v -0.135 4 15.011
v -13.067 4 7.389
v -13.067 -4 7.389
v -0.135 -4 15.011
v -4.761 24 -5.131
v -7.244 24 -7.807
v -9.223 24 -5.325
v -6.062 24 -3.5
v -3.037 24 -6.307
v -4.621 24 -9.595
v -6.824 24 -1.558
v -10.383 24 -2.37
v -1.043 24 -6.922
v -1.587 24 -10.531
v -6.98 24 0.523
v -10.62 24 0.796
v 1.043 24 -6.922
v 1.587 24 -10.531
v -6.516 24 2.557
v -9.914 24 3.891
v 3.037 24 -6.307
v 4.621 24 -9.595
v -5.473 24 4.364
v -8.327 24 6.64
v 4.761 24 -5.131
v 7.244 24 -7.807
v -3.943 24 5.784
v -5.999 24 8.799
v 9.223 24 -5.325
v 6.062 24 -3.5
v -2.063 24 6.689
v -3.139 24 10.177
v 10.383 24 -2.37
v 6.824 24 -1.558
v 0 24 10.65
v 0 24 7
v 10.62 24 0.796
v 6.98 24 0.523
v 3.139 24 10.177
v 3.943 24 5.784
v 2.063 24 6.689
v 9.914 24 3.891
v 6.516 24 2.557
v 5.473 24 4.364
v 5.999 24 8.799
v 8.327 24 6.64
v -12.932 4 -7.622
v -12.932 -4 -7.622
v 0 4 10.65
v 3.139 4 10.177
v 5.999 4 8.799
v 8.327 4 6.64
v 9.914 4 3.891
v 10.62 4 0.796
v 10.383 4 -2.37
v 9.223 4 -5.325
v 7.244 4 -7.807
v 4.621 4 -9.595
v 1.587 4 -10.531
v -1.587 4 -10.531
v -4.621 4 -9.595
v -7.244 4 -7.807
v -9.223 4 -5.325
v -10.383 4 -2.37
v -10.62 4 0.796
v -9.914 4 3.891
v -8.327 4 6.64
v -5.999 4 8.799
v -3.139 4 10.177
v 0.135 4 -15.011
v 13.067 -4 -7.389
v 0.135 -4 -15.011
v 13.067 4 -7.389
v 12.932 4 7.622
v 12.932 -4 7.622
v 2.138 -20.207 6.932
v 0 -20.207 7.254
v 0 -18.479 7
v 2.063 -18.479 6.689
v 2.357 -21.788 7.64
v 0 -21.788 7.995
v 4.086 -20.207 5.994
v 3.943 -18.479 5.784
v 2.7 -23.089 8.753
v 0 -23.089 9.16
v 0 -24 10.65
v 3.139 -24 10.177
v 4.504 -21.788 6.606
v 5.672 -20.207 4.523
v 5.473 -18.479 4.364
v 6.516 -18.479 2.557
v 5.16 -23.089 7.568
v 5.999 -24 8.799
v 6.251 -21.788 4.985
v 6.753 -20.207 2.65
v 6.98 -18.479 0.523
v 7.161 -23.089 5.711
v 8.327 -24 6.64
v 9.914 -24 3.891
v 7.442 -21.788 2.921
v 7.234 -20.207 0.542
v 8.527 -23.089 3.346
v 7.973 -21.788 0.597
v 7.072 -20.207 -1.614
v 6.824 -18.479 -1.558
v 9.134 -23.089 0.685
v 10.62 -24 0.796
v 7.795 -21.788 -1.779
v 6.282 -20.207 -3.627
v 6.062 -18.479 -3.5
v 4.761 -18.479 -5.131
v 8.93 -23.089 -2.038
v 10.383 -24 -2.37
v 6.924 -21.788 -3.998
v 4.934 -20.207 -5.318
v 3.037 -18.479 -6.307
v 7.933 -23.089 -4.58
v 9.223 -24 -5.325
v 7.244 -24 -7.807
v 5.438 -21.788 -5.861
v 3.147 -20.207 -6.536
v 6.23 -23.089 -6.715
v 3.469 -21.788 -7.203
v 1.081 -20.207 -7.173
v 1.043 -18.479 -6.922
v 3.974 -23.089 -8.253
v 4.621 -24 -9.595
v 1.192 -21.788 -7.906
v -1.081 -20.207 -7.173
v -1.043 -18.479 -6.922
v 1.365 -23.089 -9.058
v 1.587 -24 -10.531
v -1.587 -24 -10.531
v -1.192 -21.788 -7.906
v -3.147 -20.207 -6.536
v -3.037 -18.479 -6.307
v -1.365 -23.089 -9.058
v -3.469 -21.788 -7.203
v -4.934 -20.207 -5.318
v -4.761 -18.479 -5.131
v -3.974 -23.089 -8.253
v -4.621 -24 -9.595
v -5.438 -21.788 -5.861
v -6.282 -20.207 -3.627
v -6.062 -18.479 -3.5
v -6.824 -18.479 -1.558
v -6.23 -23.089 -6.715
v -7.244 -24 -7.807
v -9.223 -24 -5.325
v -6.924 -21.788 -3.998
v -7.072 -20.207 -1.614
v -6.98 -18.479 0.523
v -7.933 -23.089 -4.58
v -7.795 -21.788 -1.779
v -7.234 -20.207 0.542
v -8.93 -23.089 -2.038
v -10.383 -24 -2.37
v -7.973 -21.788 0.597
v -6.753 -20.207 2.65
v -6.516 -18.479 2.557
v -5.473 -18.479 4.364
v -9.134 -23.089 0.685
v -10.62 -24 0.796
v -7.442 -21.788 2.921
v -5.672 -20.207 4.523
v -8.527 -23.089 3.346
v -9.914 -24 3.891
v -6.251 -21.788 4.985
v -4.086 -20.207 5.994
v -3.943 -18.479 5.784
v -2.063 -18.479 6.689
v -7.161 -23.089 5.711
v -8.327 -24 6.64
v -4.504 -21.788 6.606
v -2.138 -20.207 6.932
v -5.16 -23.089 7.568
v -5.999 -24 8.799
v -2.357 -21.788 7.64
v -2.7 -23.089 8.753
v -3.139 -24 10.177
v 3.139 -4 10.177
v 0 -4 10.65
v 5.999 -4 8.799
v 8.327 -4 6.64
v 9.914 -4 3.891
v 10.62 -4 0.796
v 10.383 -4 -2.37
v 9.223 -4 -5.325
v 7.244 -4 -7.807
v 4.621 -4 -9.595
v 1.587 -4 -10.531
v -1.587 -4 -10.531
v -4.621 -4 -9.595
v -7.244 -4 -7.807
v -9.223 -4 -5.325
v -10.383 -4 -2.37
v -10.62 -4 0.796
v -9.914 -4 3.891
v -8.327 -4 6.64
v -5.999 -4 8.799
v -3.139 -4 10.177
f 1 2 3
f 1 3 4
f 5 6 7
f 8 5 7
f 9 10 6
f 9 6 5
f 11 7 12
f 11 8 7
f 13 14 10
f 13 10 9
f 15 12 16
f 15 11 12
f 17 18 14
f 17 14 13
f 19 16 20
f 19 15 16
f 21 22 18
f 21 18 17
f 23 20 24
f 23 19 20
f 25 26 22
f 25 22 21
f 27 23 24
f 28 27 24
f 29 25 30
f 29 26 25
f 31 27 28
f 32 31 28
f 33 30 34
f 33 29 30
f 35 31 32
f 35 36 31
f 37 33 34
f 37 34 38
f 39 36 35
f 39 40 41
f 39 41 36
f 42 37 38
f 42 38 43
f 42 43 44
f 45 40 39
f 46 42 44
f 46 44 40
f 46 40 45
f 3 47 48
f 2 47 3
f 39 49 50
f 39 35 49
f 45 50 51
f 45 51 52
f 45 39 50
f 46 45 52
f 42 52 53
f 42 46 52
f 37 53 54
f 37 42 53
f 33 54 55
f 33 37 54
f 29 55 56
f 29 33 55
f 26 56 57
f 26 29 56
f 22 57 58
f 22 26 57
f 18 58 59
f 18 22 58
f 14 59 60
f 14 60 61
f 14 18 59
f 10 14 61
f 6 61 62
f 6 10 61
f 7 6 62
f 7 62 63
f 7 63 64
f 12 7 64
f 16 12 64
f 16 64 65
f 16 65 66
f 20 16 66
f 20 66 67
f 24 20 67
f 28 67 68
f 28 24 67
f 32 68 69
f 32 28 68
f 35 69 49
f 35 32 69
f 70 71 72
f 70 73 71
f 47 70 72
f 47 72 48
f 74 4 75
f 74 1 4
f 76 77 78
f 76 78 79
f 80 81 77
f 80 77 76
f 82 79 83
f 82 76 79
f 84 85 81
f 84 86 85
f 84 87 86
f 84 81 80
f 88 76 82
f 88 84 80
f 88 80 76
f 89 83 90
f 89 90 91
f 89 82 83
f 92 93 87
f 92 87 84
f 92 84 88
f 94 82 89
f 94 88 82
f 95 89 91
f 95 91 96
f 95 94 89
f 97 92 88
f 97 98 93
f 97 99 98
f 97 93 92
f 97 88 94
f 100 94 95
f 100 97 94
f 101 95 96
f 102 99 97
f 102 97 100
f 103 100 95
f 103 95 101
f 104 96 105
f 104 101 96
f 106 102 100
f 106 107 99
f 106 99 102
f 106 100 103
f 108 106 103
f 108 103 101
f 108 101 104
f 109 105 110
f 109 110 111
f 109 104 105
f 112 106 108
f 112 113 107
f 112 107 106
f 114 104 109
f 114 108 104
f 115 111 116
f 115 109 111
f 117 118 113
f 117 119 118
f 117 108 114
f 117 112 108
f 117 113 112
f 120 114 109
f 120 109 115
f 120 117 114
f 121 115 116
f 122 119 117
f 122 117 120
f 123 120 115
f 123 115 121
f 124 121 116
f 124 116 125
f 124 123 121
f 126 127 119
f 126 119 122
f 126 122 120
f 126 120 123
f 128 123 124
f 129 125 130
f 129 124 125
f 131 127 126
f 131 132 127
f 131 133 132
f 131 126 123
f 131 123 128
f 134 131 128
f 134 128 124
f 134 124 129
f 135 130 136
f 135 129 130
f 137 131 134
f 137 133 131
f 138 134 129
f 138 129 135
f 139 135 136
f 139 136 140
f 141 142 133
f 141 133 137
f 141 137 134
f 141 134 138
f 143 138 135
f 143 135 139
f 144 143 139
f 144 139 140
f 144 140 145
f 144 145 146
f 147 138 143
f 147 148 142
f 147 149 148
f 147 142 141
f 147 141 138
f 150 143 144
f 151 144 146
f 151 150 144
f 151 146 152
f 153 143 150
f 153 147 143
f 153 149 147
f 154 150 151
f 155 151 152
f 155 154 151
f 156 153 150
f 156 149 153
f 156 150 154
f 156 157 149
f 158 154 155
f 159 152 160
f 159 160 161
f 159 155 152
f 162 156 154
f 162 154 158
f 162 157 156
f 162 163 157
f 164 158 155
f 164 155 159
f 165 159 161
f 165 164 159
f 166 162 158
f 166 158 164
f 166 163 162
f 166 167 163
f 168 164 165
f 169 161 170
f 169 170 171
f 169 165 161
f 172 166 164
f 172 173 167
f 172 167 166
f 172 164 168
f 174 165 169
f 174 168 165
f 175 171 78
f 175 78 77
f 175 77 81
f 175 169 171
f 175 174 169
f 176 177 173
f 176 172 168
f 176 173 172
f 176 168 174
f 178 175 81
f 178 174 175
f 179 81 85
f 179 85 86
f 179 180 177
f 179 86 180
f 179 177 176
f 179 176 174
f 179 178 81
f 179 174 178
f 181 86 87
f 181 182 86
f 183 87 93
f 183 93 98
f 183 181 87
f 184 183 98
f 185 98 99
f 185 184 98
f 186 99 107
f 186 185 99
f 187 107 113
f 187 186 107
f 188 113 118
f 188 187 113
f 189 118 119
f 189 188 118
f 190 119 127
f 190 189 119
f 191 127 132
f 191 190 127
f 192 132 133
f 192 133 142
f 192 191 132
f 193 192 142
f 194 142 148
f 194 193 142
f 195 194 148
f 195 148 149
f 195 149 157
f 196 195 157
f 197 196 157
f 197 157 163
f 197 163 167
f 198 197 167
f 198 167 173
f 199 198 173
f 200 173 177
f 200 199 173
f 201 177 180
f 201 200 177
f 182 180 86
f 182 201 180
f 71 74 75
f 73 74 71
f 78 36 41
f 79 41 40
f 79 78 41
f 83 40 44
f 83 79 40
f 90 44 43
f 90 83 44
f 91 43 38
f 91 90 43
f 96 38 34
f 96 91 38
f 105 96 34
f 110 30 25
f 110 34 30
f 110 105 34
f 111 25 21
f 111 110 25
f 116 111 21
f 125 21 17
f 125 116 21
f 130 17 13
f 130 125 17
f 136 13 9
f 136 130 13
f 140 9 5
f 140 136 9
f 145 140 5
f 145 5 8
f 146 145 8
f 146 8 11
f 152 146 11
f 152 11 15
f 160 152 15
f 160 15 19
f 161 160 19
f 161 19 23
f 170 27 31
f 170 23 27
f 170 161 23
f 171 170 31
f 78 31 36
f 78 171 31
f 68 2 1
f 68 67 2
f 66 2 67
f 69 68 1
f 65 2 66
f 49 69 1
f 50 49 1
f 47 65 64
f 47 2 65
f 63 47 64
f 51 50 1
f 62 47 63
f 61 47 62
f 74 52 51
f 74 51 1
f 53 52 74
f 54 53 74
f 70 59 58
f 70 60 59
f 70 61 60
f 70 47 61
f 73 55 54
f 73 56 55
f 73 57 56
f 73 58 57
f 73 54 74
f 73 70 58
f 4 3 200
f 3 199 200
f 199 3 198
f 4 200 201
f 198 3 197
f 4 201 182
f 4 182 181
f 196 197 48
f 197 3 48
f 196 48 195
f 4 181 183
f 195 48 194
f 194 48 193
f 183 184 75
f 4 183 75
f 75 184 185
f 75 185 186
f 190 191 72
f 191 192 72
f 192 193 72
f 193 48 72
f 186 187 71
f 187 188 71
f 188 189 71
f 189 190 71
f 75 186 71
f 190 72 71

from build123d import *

# Parameters (mm, degrees)
SKETCH1_R               = 10.65
BOSS_EXTRUDE1_DEPTH     = 24
BOSS_EXTRUDE2_DEPTH     = 4
CUT_EXTRUDE1_DEPTH      = 52.962056715
CUT_EXTRUDE1_DEPTH_BACK = 52.962056715
SKETCH3_R               = 7
FILLET1_R               = 6


with BuildPart() as part:
    # Sketch1 → Boss-Extrude1 (new, symmetric)
    with BuildSketch(Plane(origin=(0, 0, 0), x_dir=(1, 0, 0), z_dir=(0, 1, 0))):
        with Locations(Location((0, 0, 0), (0, 0, 270))):
            Circle(SKETCH1_R)
    extrude(amount=BOSS_EXTRUDE1_DEPTH, both=True)

    # Sketch2 → Boss-Extrude2 (add, symmetric)
    with BuildSketch(Plane(origin=(0, 0, 0), x_dir=(1, 0, 0), z_dir=(0, 1, 0))):
        Polygon((13.066755915, 7.388722704), (0.134556394, 15.010503919), (-12.932199521, 7.621781215), (-13.066755915, -7.388722704), (-0.134556394, -15.010503919), (12.932199521, -7.621781215), align=None)
    extrude(amount=BOSS_EXTRUDE2_DEPTH, both=True)

    # Sketch3 → Cut-Extrude1 (cut, two sides: drawn at the far end of the back side and taken through both)
    with BuildSketch(Plane(origin=(0, 24, 0), x_dir=(1, 0, 0), z_dir=(0, 1, 0)).offset(-CUT_EXTRUDE1_DEPTH_BACK)):
        with Locations(Location((0, 0, 0), (0, 0, 270))):
            Circle(SKETCH3_R)
    extrude(amount=CUT_EXTRUDE1_DEPTH + CUT_EXTRUDE1_DEPTH_BACK, mode=Mode.SUBTRACT)

    # Fillet1
    # the kernel refuses this fillet: 6 mm, written as the material it takes off along each edge
    with BuildSketch(Plane(origin=(0, -24, 0), x_dir=(0, 0, 1), z_dir=(-1, 0, 0))) as fillet1_piece_1:
        with BuildLine():
            CenterArc((13, 5.520643078), FILLET1_R, 180, 66.941755912)
            Line((7, 5.520643078), (6.88, 5.520643078))
            Line((6.88, 5.520643078), (6.88, 0))
            Line((6.88, 0), (7, -0.12))
            ThreePointArc((7, -0.12), (8.825, -0.12), (10.603, -0.110412862))
            Line((10.603, -0.110412862), (10.65, 0))
        make_face()
    revolve(axis=Axis((0, -24, 0), (0, 1, 0)), mode=Mode.SUBTRACT)


solid = part.part
